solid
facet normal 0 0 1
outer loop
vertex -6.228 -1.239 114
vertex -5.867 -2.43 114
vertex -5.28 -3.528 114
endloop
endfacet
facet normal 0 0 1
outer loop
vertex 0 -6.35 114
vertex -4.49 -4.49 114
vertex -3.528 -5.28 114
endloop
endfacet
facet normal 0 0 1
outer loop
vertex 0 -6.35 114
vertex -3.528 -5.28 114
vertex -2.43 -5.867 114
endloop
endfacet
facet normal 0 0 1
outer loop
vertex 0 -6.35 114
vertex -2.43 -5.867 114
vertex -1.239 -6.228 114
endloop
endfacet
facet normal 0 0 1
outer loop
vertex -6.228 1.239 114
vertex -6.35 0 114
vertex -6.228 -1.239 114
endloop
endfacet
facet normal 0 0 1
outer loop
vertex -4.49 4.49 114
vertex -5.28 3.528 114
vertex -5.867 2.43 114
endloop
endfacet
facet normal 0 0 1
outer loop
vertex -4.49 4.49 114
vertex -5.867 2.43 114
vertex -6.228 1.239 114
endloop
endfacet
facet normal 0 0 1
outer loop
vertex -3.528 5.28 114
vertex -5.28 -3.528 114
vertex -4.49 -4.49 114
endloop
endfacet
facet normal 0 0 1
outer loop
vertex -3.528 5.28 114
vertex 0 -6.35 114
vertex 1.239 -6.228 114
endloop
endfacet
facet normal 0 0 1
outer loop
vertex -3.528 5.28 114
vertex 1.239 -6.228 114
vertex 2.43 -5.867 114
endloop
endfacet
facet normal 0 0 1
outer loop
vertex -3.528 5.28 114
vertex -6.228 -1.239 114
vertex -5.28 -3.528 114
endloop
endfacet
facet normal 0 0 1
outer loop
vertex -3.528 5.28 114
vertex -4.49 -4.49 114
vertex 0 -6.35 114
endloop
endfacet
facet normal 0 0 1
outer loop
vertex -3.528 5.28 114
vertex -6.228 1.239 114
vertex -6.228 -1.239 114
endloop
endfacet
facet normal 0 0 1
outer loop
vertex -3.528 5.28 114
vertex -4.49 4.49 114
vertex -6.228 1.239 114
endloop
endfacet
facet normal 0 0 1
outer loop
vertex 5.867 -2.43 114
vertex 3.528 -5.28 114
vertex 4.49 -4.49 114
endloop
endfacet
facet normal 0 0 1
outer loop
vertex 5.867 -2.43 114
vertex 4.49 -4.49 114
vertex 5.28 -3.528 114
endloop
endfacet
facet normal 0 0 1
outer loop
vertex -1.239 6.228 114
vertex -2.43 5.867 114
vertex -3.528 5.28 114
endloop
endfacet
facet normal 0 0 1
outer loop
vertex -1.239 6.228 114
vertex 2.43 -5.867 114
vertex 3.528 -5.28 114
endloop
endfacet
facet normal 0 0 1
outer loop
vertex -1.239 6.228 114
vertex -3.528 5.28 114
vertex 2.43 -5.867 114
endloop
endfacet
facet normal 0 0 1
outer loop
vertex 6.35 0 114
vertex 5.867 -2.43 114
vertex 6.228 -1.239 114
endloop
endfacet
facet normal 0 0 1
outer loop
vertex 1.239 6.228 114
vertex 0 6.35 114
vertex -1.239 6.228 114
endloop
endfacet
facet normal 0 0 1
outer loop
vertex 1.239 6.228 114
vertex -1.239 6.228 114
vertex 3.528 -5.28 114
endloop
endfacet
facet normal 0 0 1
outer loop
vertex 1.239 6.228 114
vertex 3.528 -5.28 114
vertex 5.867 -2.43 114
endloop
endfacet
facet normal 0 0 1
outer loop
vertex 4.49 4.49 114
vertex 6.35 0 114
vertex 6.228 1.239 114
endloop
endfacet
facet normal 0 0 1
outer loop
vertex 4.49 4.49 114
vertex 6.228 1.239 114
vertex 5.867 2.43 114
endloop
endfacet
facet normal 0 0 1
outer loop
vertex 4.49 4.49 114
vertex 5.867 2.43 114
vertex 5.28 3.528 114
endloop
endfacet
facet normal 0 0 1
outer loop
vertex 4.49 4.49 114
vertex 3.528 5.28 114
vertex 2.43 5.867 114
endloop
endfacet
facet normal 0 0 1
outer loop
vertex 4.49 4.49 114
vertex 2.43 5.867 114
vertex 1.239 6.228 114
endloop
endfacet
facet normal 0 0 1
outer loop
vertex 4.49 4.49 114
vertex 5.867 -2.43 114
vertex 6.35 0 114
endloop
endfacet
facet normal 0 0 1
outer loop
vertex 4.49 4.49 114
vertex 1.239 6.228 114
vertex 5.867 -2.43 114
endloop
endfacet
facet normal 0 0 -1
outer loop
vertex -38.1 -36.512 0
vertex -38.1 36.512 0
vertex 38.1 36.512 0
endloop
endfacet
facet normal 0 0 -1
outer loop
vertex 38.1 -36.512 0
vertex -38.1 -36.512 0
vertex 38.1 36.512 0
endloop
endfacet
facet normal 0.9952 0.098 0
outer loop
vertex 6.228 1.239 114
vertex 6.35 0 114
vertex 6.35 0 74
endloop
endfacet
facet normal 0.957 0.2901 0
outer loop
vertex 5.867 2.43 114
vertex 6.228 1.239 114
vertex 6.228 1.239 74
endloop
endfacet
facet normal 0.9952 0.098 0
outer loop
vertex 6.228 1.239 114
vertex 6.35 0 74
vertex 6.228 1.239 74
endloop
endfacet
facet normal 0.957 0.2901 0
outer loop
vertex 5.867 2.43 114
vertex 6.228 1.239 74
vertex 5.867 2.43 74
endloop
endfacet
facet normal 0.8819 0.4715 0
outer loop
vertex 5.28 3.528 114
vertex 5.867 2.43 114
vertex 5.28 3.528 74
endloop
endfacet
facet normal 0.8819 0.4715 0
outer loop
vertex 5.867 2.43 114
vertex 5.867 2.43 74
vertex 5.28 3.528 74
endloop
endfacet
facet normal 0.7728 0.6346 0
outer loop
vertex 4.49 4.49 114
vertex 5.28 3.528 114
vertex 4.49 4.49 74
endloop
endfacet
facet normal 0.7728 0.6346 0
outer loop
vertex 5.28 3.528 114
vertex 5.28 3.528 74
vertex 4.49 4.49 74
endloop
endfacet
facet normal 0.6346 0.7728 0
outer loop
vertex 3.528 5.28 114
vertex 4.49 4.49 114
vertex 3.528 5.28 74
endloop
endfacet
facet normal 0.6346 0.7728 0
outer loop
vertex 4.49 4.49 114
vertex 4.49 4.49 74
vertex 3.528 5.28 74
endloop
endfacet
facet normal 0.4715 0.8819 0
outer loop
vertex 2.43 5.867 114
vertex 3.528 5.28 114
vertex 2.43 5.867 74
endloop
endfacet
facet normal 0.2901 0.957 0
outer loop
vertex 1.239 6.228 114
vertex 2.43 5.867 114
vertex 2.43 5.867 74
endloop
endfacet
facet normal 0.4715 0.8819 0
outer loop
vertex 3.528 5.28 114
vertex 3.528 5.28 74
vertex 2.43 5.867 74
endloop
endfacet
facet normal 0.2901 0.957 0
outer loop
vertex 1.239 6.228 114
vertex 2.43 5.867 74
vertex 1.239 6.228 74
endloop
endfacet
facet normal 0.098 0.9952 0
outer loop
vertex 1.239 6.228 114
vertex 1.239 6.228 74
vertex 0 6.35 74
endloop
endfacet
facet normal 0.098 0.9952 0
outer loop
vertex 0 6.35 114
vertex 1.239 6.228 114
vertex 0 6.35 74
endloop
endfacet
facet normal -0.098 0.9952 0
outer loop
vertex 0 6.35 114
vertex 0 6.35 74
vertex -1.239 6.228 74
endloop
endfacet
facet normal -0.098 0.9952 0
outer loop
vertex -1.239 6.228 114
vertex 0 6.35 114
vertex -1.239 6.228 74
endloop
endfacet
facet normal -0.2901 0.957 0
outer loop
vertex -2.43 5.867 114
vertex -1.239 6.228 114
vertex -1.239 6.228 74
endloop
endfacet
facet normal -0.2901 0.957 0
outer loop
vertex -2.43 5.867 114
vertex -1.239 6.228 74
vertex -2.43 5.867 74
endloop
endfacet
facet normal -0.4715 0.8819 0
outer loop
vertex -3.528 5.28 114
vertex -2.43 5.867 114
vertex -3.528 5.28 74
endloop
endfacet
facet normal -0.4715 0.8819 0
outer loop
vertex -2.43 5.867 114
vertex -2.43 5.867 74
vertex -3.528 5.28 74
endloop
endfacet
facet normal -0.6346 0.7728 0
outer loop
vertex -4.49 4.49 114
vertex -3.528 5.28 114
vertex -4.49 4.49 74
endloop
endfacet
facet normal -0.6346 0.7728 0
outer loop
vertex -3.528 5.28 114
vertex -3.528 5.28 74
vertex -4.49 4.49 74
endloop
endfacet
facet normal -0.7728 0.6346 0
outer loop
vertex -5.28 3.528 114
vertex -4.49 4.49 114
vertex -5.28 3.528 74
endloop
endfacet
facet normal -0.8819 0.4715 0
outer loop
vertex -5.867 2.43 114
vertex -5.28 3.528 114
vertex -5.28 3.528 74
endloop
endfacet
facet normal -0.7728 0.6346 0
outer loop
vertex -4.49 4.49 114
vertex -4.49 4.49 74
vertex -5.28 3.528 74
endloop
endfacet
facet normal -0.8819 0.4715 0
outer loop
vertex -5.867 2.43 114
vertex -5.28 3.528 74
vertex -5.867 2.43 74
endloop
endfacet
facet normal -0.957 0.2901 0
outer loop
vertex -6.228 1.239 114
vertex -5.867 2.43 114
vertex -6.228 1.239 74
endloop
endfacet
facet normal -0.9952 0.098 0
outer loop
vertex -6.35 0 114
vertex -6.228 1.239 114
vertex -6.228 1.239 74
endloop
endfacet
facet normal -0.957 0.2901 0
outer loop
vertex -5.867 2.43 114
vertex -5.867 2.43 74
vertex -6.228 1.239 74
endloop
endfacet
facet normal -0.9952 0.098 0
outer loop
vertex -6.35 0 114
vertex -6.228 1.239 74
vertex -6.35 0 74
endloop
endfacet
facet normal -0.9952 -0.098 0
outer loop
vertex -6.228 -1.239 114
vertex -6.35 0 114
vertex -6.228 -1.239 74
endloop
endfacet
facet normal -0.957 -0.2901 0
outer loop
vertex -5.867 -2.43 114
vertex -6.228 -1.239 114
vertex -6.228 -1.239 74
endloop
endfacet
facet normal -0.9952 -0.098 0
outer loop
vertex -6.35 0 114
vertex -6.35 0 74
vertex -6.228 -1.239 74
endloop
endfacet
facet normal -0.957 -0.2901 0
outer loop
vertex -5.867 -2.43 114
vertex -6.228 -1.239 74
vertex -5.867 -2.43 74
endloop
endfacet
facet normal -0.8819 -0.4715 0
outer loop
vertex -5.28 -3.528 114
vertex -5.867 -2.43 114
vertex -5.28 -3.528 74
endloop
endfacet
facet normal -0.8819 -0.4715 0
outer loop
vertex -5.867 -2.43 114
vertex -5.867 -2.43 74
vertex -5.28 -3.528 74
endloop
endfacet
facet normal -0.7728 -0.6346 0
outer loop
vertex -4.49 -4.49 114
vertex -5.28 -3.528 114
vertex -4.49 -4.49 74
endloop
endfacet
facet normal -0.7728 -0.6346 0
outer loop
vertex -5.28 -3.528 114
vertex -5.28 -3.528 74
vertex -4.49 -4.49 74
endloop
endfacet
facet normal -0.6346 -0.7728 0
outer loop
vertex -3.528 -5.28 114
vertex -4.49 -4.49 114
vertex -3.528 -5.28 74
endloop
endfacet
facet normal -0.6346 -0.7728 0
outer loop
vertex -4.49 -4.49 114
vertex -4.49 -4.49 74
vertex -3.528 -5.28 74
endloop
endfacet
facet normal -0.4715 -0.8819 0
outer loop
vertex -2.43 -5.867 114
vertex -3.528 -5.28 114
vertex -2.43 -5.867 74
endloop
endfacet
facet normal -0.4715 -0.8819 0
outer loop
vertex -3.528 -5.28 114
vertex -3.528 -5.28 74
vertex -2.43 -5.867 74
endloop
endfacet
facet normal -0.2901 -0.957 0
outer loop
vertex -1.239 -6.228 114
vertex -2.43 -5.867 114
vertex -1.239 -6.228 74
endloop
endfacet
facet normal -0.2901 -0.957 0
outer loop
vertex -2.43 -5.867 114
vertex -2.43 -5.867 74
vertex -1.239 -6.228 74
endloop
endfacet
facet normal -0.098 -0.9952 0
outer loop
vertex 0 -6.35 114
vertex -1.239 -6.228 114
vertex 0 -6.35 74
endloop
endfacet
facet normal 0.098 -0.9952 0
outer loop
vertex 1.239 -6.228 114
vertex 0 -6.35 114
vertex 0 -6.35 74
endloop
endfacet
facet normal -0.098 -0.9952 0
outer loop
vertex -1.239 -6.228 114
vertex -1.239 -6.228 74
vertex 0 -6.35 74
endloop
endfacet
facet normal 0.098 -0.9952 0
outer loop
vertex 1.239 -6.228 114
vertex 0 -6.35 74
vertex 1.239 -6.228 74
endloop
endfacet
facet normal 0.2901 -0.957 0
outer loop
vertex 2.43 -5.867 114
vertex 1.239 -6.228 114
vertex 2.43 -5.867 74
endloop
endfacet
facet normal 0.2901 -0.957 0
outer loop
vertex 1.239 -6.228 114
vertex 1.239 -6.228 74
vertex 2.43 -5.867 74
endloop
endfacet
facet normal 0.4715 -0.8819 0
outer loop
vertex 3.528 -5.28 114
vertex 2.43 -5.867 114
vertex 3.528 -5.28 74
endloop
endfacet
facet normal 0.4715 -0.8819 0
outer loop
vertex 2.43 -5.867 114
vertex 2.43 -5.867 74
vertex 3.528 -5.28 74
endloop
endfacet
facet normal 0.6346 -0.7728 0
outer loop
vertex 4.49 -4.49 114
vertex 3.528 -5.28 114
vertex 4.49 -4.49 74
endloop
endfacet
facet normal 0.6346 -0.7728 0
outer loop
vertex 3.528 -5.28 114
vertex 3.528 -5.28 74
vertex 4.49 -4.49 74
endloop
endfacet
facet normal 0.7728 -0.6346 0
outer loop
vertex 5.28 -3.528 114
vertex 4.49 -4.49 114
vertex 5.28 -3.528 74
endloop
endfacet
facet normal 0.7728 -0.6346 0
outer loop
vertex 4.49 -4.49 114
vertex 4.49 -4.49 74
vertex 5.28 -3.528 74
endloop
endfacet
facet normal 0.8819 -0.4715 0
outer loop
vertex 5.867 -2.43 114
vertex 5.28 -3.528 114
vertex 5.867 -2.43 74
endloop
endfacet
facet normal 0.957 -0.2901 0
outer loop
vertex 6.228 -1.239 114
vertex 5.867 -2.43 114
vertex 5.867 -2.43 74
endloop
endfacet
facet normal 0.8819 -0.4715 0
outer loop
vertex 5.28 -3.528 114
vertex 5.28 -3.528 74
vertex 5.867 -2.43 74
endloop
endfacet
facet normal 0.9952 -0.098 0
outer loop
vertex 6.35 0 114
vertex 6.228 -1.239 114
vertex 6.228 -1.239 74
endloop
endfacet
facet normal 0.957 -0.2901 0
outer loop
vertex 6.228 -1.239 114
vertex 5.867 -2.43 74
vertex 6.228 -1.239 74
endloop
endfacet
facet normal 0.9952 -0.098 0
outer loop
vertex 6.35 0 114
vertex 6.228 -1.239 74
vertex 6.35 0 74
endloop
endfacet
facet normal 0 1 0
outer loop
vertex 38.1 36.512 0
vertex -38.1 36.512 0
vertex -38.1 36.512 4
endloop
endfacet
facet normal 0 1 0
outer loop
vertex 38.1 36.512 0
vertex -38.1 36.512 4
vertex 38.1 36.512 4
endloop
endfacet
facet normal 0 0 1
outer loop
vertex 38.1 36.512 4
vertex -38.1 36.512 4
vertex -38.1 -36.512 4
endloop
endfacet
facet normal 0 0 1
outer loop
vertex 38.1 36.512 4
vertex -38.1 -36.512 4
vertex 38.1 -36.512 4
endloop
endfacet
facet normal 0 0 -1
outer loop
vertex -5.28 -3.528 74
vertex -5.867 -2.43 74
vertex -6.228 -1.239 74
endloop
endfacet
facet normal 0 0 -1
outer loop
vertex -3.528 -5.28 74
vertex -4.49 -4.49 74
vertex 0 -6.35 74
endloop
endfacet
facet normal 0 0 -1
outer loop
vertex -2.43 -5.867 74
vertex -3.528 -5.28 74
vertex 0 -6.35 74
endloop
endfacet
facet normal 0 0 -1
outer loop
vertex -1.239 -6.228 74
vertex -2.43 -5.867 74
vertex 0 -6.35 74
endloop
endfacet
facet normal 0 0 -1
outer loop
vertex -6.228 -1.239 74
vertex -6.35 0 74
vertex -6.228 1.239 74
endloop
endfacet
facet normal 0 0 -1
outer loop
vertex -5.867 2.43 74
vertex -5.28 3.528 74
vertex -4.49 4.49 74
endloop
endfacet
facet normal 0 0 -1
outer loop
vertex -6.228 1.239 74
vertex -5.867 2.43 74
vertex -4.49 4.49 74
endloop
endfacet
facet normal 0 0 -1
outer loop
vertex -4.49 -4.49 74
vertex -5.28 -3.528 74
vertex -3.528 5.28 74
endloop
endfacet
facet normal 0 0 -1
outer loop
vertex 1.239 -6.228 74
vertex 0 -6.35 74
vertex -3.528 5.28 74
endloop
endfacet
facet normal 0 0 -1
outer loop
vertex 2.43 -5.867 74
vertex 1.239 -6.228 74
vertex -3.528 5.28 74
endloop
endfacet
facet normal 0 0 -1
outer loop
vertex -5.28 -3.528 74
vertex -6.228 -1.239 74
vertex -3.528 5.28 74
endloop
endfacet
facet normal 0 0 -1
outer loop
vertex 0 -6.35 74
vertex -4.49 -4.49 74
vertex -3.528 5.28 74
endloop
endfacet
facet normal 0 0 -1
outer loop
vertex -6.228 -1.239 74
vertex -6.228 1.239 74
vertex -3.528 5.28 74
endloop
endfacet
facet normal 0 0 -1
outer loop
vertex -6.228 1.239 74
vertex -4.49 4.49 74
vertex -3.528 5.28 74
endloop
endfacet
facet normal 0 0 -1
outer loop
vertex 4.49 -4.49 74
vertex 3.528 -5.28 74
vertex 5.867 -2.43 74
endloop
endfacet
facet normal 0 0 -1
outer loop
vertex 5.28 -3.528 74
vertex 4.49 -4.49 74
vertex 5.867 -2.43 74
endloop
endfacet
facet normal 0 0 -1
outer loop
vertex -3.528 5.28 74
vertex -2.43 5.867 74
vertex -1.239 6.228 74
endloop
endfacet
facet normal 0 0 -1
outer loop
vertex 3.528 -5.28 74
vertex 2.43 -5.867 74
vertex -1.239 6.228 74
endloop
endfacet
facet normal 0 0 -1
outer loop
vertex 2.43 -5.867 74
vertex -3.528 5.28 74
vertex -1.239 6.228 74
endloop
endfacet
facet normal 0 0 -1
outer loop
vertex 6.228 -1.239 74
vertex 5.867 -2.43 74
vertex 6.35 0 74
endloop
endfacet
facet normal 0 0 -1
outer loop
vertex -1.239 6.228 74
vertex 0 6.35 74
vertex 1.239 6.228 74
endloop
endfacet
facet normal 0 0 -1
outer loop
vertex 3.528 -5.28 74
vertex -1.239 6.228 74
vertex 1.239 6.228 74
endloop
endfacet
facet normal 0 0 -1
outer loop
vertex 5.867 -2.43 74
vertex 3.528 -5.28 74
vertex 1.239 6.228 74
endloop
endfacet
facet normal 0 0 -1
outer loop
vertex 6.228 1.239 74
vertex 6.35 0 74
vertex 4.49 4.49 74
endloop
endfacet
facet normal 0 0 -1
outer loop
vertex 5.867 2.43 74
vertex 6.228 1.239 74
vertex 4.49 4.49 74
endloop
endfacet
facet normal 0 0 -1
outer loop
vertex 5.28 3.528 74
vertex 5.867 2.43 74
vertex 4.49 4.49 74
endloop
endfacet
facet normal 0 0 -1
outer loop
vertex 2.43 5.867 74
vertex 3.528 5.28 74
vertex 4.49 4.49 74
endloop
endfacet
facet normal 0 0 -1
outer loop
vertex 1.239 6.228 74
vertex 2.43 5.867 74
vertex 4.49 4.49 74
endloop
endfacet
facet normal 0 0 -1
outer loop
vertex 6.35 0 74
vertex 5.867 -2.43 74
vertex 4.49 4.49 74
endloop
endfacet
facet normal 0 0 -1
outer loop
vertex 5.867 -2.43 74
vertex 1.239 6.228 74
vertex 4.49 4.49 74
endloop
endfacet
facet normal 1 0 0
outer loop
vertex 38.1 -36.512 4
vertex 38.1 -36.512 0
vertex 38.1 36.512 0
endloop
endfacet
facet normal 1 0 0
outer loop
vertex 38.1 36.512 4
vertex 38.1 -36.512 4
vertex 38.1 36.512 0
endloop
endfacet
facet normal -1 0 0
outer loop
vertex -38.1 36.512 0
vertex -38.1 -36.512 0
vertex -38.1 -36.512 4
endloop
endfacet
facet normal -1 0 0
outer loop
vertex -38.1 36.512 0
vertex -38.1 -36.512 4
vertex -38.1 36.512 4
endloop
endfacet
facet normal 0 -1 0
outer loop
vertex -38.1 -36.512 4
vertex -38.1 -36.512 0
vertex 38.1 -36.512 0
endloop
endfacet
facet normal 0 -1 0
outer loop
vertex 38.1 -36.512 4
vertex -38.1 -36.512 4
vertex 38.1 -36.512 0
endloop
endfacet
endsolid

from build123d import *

# Parameters (mm, degrees)
F0_W     = 76.2
F0_H     = 73.025
F1_DEPTH = 4
F3_R     = 6.35
F4_DEPTH = 40


with BuildPart() as f1:
    # F0 (on Top) → F1 (new body)
    with BuildSketch(Plane.XY):
        Rectangle(F0_W, F0_H)
    extrude(amount=F1_DEPTH)


with BuildPart() as f4:
    # F3 (on offset) → F4 (new body)
    with BuildSketch(Plane.XY.offset(74)):
        Circle(F3_R)
    extrude(amount=F4_DEPTH)


solid = Compound([f1.part, f4.part])
